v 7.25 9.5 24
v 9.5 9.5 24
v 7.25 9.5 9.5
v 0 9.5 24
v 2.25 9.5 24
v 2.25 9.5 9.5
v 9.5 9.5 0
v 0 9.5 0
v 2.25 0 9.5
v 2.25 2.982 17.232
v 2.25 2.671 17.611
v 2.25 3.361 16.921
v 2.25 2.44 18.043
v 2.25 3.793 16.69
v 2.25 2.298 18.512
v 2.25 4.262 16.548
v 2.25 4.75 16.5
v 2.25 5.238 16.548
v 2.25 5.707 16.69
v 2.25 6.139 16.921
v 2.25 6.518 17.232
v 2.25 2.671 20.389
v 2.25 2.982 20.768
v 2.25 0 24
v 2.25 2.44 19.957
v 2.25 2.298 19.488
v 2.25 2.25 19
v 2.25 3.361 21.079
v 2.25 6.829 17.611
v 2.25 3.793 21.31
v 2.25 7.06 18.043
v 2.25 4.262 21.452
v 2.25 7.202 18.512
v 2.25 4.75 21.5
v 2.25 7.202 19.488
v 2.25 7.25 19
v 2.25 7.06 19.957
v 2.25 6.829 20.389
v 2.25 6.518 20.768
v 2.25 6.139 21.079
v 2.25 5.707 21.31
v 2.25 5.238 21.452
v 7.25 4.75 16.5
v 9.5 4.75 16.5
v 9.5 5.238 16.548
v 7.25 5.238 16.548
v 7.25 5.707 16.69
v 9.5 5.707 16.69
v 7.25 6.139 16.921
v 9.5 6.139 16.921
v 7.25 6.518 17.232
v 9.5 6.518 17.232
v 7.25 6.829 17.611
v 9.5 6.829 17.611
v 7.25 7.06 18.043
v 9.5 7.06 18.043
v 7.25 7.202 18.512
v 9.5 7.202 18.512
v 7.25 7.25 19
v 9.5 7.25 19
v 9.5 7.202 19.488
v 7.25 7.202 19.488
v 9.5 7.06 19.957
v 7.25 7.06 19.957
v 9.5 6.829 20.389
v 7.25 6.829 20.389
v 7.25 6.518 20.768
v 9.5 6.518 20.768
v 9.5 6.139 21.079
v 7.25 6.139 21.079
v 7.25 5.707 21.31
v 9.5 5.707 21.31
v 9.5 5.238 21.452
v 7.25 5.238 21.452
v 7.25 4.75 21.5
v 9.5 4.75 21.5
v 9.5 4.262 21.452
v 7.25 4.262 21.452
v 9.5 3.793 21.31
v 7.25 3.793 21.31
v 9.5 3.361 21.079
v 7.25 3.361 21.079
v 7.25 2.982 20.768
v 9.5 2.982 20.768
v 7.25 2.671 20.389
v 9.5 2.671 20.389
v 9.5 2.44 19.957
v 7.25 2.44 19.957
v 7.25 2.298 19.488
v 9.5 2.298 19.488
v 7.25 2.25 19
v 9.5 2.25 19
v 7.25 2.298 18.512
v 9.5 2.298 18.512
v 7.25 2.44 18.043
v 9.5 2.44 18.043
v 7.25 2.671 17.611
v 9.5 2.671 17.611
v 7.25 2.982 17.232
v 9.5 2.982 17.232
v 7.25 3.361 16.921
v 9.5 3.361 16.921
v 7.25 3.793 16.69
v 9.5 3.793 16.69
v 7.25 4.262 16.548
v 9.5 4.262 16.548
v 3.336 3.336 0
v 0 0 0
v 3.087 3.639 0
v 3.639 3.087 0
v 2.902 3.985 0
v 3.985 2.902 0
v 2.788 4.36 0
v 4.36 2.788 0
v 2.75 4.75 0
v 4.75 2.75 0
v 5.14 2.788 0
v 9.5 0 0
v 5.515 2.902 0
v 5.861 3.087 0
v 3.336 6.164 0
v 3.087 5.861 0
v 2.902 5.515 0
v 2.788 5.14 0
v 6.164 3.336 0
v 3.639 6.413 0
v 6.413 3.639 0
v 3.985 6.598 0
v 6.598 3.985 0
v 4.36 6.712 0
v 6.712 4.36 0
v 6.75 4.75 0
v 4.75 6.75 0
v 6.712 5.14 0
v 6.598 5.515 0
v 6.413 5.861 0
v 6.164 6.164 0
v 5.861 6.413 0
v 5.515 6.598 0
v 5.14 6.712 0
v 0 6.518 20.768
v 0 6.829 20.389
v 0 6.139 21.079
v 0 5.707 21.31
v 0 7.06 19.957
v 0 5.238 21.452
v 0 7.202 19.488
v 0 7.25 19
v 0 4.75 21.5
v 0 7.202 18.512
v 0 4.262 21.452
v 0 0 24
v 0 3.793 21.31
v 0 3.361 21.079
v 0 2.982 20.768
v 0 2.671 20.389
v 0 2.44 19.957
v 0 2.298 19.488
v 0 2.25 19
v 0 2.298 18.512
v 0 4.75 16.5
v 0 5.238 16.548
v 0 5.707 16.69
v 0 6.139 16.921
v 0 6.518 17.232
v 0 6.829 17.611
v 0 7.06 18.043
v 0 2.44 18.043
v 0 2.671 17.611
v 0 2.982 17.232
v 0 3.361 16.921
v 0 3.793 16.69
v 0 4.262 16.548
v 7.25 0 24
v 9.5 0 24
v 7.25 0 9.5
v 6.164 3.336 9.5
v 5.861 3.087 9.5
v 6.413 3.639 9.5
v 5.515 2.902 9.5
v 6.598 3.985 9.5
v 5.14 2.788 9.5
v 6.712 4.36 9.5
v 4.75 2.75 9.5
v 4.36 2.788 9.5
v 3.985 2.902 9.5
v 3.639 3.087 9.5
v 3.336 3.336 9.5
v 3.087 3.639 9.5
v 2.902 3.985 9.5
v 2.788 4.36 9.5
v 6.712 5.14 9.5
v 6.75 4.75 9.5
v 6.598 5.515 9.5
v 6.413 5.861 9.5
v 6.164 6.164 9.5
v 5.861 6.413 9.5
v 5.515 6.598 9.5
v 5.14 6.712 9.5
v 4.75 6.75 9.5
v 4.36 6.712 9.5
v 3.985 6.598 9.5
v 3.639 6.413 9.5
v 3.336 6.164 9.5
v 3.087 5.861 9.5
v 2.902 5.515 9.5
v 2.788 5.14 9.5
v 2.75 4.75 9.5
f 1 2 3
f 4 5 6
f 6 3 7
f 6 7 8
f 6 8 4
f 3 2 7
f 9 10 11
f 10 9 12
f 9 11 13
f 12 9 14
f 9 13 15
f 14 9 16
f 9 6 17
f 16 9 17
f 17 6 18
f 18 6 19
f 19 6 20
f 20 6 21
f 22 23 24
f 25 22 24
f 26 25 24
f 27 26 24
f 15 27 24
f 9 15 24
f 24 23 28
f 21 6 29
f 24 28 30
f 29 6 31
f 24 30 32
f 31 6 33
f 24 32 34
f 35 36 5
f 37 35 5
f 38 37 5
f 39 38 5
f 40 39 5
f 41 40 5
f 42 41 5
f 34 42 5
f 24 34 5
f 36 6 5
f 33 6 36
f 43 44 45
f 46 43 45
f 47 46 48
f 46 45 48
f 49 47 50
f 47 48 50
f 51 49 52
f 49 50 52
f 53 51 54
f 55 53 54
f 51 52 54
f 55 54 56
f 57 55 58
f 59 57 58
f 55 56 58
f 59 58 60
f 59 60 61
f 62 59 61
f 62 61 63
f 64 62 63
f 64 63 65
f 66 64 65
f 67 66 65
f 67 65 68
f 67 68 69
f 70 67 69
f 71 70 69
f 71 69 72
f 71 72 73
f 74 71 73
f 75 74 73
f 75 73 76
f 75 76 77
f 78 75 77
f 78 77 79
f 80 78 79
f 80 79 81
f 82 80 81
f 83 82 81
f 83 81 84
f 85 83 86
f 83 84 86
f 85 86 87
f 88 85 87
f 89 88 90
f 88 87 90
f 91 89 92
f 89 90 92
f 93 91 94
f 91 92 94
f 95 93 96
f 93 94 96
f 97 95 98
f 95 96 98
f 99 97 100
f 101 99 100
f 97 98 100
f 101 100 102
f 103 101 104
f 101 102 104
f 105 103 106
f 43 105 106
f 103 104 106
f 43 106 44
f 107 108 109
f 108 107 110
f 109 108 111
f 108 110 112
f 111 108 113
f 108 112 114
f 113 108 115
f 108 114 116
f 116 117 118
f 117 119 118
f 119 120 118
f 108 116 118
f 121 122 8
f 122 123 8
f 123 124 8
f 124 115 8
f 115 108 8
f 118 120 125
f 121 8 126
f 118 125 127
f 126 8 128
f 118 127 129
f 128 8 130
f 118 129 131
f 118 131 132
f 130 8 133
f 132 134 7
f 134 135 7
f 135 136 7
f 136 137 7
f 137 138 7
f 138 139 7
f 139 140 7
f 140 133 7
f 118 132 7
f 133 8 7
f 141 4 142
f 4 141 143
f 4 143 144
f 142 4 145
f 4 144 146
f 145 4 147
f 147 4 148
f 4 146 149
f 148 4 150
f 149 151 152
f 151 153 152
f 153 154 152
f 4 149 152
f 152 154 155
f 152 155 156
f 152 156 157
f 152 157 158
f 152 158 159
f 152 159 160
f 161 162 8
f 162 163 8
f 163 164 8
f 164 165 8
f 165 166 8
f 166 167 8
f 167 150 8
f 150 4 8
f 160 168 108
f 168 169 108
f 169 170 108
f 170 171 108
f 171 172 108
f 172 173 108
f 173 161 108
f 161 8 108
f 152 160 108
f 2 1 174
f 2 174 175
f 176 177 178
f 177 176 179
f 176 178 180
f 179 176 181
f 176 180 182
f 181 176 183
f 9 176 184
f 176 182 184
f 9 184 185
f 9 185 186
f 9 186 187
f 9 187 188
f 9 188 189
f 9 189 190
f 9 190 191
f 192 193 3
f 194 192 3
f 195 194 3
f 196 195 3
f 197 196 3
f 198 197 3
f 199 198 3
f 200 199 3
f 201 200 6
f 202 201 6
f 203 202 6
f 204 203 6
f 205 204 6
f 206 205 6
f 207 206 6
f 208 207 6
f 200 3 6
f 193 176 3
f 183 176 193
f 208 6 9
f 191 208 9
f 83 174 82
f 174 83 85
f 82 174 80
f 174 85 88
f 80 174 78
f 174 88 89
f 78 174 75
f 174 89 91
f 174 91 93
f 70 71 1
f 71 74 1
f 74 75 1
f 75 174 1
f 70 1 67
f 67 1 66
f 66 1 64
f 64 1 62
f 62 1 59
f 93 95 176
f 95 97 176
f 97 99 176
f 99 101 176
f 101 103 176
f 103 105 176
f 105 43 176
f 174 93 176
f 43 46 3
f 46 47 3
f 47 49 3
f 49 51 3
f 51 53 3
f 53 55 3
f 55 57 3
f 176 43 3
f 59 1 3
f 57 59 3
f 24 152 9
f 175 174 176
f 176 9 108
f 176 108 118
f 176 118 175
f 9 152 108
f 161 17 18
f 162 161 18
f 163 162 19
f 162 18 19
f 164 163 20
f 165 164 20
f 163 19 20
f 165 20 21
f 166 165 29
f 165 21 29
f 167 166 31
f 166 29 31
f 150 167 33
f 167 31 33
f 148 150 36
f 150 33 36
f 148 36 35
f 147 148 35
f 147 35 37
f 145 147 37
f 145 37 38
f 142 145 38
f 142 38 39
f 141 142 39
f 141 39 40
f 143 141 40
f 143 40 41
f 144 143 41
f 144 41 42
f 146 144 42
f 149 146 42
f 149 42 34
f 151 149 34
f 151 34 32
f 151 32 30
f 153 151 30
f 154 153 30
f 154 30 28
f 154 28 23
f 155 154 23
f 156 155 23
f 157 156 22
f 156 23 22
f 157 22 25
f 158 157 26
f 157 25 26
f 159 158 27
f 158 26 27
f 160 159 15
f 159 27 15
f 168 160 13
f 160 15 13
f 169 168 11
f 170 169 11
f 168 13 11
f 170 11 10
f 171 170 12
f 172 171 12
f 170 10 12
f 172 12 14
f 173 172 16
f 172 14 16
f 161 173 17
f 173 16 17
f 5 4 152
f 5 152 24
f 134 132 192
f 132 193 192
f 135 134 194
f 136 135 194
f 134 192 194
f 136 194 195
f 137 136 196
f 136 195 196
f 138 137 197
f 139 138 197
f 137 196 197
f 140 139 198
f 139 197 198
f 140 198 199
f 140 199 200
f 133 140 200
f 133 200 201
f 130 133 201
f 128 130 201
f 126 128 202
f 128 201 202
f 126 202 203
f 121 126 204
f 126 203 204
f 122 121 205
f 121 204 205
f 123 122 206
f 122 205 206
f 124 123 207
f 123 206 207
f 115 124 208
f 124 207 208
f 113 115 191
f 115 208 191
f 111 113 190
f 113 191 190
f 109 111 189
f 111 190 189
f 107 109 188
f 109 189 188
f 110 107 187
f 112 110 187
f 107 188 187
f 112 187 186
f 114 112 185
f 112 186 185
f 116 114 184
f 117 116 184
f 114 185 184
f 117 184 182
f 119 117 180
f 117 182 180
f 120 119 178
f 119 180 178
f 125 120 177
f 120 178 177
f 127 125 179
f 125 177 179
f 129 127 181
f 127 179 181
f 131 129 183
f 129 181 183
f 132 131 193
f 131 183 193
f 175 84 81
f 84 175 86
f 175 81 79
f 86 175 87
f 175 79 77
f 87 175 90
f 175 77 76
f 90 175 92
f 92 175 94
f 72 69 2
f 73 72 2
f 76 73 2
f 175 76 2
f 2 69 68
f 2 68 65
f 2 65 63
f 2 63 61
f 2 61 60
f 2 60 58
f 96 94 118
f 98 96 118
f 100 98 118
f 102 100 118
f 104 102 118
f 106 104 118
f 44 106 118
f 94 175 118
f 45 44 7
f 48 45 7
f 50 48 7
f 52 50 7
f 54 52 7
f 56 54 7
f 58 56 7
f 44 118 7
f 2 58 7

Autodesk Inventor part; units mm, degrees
ref_plane "YZ Plane" through (0, 0, 0) normal (1, 0, 0) x (0, 1, 0)
ref_plane "XZ Plane" through (0, 0, 0) normal (0, 1, 0) x (-1, 0, 0)
ref_plane "XY Plane" through (0, 0, 0) normal (0, 0, 1) x (1, 0, 0)
sketch "Sketch1" plane through (0, 0, 0) normal (0, 0, 1) x (1, 0, 0)
  line L0 (0, 0) -> (9.5, 0)
  line L1 (9.5, 0) -> (9.5, 9.5)
  line L2 (9.5, 9.5) -> (0, 9.5)
  line L3 (0, 9.5) -> (0, 0)
  dimension "d0" = 9.5
  dimension "d1" = 9.5
extrude "Extrusion1" add sketch "Sketch1" along normal blind 24
sketch "Sketch2" plane through (0, 9.5, 0) normal (0, 1, 0) x (1, 0, 0)
  line L0 (0, -24) -> (9.5, -24) projected
  line L1 (2.25, -24) -> (7.25, -24)
  line L2 (7.25, -24) -> (7.25, -9.5)
  line L3 (7.25, -9.5) -> (2.25, -9.5)
  line L4 (2.25, -9.5) -> (2.25, -24)
  line L5 (0, 0) -> (0, -24) projected
  dimension "d4" = 14.5
  dimension "d5" = 5
  dimension "d6" = 2.25
extrude "Extrusion2" cut sketch "Sketch2" against normal up to next
sketch "Sketch3" plane through (9.5, 0, 0) normal (1, 0, 0) x (0, 0, -1)
  circle A0 centre (-19, 4.75) radius 2.5
  line L0 (-24, 0) -> (-24, 9.5) projected
  line L1 (0, 9.5) -> (-24, 9.5) projected
  point P0 (0, 0)
  dimension "d9" = 5
  dimension "d10" = 5
  dimension "d11" = 4.75
extrude "Extrusion3" cut sketch "Sketch3" against normal through all
sketch "Sketch4" plane through (2.25, 9.5, 9.5) normal (0, 0, 1) x (1, 0, 0)
  circle A0 centre (2.5, -4.75) radius 2
  line L0 (0, 0) -> (5, 0) projected
  line L1 (0, -9.5) -> (0, 0) projected
  point P0 (-2.25, -9.5)
  dimension "d14" = 4
  dimension "d15" = 4.75
  dimension "d16" = 2.5
extrude "Extrusion4" cut sketch "Sketch4" against normal up to next
properties part number "piston_rod_connector" material "Steel, Non-Alloy"
